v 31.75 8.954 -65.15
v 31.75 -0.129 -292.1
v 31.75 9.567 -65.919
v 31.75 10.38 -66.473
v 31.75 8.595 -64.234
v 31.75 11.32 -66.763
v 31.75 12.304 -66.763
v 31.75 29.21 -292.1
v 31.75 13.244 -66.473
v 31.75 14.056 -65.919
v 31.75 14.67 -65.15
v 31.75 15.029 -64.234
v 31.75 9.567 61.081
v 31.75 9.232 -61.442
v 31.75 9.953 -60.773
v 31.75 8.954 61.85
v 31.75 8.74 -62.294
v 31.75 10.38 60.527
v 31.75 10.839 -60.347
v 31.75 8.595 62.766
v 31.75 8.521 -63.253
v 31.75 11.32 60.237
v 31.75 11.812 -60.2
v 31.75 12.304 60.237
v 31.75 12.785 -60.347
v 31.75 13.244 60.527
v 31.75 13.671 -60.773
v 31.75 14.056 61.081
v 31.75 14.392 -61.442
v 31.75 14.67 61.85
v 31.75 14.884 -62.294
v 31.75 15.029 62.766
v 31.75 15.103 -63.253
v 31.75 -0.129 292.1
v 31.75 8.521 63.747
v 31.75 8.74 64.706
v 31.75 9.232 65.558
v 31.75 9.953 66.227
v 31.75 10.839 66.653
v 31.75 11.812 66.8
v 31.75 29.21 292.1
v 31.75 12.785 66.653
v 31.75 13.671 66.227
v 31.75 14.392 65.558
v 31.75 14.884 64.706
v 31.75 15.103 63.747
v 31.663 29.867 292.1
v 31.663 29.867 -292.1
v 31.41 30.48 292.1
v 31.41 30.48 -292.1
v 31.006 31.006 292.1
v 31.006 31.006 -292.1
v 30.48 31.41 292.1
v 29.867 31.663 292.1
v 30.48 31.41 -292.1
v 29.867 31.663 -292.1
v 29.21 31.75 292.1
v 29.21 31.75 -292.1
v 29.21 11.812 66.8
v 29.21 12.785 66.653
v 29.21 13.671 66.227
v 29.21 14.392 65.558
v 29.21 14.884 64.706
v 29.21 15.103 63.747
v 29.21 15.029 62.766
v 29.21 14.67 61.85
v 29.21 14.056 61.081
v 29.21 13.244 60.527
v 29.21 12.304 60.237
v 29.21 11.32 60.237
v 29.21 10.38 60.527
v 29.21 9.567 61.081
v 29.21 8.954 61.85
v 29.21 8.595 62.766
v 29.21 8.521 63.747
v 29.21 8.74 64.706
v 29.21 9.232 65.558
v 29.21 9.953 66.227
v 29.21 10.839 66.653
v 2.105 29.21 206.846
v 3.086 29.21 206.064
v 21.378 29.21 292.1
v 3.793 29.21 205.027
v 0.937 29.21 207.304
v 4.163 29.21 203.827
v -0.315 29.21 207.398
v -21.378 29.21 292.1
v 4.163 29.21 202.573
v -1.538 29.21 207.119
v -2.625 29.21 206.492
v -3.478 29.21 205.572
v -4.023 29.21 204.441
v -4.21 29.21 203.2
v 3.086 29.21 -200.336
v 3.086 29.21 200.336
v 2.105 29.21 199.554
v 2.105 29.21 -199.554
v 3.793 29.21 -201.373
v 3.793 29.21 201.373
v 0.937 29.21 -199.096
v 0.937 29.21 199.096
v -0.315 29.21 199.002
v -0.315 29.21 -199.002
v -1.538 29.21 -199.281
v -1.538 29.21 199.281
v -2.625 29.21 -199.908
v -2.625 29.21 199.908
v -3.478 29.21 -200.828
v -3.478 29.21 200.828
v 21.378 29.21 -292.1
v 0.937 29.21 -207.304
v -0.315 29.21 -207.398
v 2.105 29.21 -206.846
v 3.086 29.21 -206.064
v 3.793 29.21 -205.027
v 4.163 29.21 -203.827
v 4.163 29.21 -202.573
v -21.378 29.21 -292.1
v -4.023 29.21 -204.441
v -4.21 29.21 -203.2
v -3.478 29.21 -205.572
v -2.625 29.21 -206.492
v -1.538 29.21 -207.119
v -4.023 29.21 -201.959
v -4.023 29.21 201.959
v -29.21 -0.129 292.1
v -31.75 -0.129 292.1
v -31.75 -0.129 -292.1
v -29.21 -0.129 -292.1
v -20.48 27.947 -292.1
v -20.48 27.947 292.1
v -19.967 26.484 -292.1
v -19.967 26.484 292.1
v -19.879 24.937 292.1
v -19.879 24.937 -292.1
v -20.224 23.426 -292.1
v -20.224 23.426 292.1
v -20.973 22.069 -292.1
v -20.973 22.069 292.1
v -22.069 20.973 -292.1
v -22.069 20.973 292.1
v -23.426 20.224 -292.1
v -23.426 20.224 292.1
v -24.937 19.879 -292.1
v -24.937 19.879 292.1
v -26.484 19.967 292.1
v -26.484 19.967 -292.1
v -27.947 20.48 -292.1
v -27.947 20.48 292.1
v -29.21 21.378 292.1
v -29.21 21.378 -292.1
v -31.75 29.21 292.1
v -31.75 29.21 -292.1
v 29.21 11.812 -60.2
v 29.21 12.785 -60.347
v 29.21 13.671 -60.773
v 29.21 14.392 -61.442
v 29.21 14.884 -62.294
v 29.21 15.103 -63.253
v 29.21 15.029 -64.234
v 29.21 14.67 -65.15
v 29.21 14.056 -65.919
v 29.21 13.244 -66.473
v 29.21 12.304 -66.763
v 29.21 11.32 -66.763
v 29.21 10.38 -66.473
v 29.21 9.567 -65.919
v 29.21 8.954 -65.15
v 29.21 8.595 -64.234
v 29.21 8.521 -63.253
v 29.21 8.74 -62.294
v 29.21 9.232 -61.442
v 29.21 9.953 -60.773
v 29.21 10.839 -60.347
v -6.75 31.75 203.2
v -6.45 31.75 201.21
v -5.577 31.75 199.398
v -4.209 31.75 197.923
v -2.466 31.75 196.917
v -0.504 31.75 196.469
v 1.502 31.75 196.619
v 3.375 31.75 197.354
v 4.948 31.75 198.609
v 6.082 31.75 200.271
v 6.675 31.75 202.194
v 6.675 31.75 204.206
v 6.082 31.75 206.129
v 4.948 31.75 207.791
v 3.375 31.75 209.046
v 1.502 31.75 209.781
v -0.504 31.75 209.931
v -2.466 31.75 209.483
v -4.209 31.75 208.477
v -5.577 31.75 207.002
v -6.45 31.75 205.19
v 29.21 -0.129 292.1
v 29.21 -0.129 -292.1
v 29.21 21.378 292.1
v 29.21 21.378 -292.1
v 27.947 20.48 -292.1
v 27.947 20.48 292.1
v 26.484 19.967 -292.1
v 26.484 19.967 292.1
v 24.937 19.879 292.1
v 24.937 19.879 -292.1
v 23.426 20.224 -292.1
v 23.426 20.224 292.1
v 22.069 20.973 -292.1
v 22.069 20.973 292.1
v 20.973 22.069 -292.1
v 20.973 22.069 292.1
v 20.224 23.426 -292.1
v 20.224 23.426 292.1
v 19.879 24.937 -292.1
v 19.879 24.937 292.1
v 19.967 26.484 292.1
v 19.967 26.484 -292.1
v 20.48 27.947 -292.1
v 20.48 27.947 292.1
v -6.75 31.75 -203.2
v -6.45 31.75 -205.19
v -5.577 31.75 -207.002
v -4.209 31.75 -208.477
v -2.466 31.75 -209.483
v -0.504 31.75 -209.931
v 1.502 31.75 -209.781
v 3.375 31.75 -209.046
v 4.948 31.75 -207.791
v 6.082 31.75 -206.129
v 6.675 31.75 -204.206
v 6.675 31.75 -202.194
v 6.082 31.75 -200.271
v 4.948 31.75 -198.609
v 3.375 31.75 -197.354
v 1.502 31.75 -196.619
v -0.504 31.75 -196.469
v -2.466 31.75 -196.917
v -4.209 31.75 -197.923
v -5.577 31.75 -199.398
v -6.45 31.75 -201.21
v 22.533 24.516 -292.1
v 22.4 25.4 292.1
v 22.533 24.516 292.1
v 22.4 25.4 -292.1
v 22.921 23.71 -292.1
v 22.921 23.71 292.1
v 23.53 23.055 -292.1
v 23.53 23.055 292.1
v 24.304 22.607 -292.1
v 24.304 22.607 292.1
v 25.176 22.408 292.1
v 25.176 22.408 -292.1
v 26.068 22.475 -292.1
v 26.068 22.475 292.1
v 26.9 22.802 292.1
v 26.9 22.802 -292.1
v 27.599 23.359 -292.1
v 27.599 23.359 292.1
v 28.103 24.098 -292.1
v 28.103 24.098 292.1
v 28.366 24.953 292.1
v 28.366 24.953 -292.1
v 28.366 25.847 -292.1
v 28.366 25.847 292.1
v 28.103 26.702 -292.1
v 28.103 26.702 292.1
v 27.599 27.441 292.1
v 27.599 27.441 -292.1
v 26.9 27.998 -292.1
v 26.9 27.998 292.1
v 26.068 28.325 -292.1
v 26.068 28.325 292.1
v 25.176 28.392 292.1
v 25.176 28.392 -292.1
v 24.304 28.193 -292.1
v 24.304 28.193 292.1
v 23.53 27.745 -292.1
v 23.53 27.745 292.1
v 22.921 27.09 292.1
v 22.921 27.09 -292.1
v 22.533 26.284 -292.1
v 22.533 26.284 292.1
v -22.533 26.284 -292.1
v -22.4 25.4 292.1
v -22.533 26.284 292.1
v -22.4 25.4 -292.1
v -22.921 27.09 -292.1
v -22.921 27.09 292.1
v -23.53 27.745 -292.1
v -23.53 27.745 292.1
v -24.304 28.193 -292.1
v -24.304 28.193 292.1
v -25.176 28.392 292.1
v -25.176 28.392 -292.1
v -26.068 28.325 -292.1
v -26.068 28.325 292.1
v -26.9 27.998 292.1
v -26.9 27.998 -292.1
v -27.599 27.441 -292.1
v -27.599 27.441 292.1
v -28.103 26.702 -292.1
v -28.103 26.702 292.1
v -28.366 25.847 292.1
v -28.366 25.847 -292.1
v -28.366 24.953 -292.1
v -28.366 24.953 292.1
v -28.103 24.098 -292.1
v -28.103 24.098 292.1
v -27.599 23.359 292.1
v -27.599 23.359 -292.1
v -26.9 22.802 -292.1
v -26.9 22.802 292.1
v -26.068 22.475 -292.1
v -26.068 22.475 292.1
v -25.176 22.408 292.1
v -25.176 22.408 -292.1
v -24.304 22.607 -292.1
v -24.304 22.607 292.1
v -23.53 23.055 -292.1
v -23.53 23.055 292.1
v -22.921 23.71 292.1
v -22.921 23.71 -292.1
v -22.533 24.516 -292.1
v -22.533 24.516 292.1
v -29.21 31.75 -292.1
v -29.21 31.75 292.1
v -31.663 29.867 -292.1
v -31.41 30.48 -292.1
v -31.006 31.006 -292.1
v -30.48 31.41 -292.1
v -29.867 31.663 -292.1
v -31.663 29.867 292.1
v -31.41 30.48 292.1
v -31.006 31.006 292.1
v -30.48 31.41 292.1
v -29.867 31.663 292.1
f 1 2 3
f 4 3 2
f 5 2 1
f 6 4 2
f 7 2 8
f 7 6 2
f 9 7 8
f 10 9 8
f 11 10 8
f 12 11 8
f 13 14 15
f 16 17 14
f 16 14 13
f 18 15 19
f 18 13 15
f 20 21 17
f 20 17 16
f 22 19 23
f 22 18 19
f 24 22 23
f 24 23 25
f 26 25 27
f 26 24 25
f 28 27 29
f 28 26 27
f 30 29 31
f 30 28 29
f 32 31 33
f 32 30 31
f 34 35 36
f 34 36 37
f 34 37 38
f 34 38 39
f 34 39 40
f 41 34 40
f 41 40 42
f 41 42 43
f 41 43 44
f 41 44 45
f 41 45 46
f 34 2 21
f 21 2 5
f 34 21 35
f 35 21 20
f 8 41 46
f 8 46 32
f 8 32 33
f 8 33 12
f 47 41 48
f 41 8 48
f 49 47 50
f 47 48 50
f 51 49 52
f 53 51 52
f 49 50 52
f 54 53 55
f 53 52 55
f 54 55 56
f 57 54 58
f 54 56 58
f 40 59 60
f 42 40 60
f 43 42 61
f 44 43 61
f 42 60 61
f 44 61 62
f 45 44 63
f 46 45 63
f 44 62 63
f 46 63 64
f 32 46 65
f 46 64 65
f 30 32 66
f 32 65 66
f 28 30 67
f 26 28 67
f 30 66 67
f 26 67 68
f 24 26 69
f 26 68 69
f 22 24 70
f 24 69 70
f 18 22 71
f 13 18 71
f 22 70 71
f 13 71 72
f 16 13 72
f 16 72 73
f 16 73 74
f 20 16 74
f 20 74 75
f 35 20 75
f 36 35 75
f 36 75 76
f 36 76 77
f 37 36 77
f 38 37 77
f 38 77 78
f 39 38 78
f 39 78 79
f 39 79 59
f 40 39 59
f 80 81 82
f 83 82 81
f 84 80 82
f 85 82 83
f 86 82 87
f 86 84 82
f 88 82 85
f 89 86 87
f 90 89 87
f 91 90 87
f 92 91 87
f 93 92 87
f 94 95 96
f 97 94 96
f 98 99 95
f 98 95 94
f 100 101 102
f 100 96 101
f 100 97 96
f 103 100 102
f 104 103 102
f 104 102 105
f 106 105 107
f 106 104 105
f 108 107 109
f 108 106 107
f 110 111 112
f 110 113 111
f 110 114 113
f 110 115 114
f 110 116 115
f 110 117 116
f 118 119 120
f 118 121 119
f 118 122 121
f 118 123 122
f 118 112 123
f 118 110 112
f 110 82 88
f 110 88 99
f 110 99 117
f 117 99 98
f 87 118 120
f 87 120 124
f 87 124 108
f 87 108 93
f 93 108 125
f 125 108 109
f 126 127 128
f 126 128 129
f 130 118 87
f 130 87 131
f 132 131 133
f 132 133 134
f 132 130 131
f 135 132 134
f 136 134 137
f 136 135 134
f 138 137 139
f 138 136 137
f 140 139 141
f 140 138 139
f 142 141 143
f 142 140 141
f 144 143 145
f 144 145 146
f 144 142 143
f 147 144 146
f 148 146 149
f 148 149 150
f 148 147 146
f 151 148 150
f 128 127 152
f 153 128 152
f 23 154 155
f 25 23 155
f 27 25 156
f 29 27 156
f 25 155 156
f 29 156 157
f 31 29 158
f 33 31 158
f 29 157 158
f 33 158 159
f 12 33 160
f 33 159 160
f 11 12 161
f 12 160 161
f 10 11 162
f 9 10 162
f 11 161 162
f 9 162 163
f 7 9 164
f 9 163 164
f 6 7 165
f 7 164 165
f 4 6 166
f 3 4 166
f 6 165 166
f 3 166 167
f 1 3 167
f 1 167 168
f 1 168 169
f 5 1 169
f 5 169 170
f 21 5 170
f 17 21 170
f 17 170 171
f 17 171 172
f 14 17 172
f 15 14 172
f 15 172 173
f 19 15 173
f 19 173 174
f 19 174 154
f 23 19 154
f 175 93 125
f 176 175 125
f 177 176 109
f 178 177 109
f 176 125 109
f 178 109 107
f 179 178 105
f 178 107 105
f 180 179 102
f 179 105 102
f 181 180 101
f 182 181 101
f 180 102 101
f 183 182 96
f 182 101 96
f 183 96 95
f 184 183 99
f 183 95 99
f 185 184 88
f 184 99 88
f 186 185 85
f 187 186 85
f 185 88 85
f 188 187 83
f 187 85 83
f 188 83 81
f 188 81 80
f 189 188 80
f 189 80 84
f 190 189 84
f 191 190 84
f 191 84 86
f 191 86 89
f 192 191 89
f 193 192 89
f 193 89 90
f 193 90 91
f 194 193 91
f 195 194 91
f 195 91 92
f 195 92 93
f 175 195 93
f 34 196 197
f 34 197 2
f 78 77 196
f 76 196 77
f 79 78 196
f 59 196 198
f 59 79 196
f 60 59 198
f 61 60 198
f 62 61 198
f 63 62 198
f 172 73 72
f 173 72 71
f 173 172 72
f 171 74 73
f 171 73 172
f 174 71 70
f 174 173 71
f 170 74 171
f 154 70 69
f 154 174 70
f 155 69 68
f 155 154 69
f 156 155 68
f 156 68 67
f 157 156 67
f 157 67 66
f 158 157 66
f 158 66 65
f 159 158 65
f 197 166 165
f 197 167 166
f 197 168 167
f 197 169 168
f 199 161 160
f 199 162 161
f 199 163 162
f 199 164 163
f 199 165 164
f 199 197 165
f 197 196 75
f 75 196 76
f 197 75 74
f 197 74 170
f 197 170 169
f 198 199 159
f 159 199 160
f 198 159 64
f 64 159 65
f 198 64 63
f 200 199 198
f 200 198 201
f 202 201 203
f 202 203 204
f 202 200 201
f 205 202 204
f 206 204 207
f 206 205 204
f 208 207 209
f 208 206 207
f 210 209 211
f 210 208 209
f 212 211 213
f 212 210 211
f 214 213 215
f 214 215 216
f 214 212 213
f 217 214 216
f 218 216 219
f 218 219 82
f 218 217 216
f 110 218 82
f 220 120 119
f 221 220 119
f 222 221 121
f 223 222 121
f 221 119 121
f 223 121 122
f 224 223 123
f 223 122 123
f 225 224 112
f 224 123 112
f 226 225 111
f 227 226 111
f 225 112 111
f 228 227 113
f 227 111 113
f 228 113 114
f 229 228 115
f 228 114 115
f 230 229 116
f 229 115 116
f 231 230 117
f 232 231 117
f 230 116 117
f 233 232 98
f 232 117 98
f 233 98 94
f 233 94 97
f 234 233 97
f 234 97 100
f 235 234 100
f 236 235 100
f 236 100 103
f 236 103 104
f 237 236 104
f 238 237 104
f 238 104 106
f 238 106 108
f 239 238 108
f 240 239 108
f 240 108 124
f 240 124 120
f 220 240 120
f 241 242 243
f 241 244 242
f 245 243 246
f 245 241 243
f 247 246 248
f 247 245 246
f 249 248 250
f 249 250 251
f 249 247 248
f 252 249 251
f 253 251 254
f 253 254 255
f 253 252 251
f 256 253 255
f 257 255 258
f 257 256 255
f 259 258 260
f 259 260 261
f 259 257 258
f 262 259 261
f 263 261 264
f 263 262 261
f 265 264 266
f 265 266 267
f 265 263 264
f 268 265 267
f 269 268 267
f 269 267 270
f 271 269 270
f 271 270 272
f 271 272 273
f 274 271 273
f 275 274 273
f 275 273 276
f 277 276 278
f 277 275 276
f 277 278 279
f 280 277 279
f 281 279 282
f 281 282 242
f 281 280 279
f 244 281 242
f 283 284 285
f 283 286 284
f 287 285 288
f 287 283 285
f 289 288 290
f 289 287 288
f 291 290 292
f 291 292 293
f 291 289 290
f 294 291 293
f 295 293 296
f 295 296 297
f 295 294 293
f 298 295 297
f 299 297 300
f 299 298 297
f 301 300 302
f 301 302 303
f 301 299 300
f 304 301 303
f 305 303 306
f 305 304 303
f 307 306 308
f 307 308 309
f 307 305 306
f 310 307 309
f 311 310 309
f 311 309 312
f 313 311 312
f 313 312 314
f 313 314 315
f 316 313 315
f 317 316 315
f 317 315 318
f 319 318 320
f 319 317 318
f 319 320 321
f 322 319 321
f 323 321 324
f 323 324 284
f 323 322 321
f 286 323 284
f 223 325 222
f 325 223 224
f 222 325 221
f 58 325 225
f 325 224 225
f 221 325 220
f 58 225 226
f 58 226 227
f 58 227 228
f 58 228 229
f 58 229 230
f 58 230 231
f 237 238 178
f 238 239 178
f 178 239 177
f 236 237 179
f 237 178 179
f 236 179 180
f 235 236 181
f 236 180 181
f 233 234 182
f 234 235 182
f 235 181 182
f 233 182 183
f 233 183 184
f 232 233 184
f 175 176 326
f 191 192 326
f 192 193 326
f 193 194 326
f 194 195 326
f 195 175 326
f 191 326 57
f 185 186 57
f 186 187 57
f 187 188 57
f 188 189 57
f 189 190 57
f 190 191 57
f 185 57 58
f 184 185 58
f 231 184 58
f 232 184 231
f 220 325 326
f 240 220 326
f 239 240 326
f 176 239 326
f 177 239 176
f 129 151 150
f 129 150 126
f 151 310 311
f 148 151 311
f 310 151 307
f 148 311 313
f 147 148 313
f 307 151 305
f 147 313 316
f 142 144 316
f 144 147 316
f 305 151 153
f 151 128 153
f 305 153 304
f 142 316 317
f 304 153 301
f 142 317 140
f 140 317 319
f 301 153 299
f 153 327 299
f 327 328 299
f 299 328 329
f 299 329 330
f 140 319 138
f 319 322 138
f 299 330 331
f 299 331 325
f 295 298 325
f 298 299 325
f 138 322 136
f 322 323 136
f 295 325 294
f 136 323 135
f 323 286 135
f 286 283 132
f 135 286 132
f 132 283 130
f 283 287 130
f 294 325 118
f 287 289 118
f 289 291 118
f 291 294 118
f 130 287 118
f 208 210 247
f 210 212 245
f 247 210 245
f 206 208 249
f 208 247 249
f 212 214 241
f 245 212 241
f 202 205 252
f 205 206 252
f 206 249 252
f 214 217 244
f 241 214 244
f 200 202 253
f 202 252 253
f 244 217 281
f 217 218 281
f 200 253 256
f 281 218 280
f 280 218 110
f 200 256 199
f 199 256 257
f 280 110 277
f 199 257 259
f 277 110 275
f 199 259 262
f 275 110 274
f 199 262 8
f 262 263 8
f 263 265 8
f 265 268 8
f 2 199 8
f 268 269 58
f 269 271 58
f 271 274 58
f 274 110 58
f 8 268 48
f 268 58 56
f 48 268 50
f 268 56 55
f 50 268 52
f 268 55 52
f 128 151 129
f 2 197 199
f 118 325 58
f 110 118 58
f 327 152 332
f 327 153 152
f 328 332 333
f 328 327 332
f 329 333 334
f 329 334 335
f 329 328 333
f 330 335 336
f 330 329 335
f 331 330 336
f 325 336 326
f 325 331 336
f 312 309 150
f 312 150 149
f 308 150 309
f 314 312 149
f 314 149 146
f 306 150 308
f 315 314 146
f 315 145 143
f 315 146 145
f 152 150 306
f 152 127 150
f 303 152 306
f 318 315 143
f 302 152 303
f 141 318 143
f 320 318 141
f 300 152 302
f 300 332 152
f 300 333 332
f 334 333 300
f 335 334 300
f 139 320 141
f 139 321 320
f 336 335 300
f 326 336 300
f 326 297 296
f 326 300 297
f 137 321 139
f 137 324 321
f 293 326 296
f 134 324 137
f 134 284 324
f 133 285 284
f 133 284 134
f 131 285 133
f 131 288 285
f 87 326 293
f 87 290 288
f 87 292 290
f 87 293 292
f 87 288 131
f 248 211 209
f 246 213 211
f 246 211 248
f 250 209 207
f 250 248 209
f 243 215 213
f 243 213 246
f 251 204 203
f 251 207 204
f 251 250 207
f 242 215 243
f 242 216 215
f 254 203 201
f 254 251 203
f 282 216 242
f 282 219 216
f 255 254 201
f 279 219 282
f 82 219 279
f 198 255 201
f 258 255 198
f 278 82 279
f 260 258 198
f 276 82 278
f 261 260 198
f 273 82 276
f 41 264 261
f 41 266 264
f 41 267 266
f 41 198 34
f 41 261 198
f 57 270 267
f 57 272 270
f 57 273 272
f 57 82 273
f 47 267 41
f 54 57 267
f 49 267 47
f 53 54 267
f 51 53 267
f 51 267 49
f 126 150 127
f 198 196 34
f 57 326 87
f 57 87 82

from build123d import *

# Parameters (mm, degrees)
SKETCH1_W                                            = 63.5
SKETCH1_H                                            = 63.5
SKETCH1_R                                            = 3
BOSS_EXTRUDE1_DEPTH                                  = 292.1
FILLET1_R                                            = 2.54
SHELL1_START                                         = -292.1
SHELL1_DEPTH                                         = 584.2
SKETCH3_W                                            = 63.665273771
SKETCH3_H                                            = 31.75
CUT_EXTRUDE2_DEPTH                                   = 586.923002621
CSK_FOR_M6_HEX_SOCKET_COUNTERSUNK_HEAD_S_D           = 6.4
CSK_FOR_M6_HEX_SOCKET_COUNTERSUNK_HEAD_S_CSINK_D     = 13.5
CSK_FOR_M6_HEX_SOCKET_COUNTERSUNK_HEAD_S_CSINK_ANGLE = 90
M6_CLEARANCE_HOLE1_D                                 = 6.6
M6_CLEARANCE_HOLE1_DEPTH                             = 2.54


# Read off the part's stored shape, not the designer's step: Shell1
with BuildPart() as part:
    # Sketch1 → Boss-Extrude1 (new, symmetric)
    with BuildSketch(Plane.XY):
        Rectangle(SKETCH1_W, SKETCH1_H)
        with Locations((-25.4, 25.4)):
            Circle(SKETCH1_R, mode=Mode.SUBTRACT)
        with Locations(Location((25.4, -25.4, 0), (0, 0, 180))):
            Circle(SKETCH1_R, mode=Mode.SUBTRACT)
        with Locations(Location((-25.4, -25.4, 0), (0, 0, 180))):
            Circle(SKETCH1_R, mode=Mode.SUBTRACT)
        with Locations(Location((25.4, 25.4, 0), (0, 0, 180))):
            Circle(SKETCH1_R, mode=Mode.SUBTRACT)
    extrude(amount=BOSS_EXTRUDE1_DEPTH, both=True)

    # Fillet1
    fillet1_edges = [part.edges().sort_by_distance(p)[0] for p in [
        (31.75, -31.75, 0),
        (-31.75, -31.75, 0),
        (-31.75, 31.75, 0),
        (31.75, 31.75, 0),
    ]]
    fillet(fillet1_edges, radius=FILLET1_R)

    # Shell1 outline → Shell1 (cut)
    with BuildSketch(Plane.XY.offset(SHELL1_START)):
        with BuildLine():
            Line((29.21, -21.378122329), (29.21, 21.378122329))
            ThreePointArc((29.21, 21.378122329), (21.482628432, 21.482628432), (21.378122329, 29.21))
            Line((21.378122329, 29.21), (-21.378122329, 29.21))
            ThreePointArc((-21.378122329, 29.21), (-21.482628432, 21.482628432), (-29.21, 21.378122329))
            Line((-29.21, 21.378122329), (-29.21, -21.378122329))
            ThreePointArc((-29.21, -21.378122329), (-21.482628432, -21.482628432), (-21.378122329, -29.21))
            Line((-21.378122329, -29.21), (21.378122329, -29.21))
            ThreePointArc((21.378122329, -29.21), (21.482628432, -21.482628432), (29.21, -21.378122329))
        make_face()
    extrude(amount=SHELL1_DEPTH, mode=Mode.SUBTRACT)

    # Sketch3 → Cut-Extrude2 (cut, through all)
    with BuildSketch(Plane.XY.offset(292.1)):
        with Locations((0.082636885, -16.003852467)):
            Rectangle(SKETCH3_W, SKETCH3_H)
    extrude(amount=-CUT_EXTRUDE2_DEPTH, mode=Mode.SUBTRACT)

    # CSK for M6 Hex Socket Countersunk Head Screw1 (through all)
    with Locations(Plane(origin=(0, 31.75, 0), x_dir=(1, 0, 0), z_dir=(0, 1, 0))):
        with Locations((0, 203.2), (0, -203.2)):
            CounterSinkHole(CSK_FOR_M6_HEX_SOCKET_COUNTERSUNK_HEAD_S_D / 2, CSK_FOR_M6_HEX_SOCKET_COUNTERSUNK_HEAD_S_CSINK_D / 2, counter_sink_angle=CSK_FOR_M6_HEX_SOCKET_COUNTERSUNK_HEAD_S_CSINK_ANGLE)

    # M6 Clearance Hole1
    with Locations(Plane(origin=(31.75, 0, 0), x_dir=(0, 0, -1), z_dir=(1, 0, 0))):
        with Locations((63.5, 11.811849331), (-63.5, 11.811849331)):
            Hole(M6_CLEARANCE_HOLE1_D / 2, depth=M6_CLEARANCE_HOLE1_DEPTH)


solid = part.part
